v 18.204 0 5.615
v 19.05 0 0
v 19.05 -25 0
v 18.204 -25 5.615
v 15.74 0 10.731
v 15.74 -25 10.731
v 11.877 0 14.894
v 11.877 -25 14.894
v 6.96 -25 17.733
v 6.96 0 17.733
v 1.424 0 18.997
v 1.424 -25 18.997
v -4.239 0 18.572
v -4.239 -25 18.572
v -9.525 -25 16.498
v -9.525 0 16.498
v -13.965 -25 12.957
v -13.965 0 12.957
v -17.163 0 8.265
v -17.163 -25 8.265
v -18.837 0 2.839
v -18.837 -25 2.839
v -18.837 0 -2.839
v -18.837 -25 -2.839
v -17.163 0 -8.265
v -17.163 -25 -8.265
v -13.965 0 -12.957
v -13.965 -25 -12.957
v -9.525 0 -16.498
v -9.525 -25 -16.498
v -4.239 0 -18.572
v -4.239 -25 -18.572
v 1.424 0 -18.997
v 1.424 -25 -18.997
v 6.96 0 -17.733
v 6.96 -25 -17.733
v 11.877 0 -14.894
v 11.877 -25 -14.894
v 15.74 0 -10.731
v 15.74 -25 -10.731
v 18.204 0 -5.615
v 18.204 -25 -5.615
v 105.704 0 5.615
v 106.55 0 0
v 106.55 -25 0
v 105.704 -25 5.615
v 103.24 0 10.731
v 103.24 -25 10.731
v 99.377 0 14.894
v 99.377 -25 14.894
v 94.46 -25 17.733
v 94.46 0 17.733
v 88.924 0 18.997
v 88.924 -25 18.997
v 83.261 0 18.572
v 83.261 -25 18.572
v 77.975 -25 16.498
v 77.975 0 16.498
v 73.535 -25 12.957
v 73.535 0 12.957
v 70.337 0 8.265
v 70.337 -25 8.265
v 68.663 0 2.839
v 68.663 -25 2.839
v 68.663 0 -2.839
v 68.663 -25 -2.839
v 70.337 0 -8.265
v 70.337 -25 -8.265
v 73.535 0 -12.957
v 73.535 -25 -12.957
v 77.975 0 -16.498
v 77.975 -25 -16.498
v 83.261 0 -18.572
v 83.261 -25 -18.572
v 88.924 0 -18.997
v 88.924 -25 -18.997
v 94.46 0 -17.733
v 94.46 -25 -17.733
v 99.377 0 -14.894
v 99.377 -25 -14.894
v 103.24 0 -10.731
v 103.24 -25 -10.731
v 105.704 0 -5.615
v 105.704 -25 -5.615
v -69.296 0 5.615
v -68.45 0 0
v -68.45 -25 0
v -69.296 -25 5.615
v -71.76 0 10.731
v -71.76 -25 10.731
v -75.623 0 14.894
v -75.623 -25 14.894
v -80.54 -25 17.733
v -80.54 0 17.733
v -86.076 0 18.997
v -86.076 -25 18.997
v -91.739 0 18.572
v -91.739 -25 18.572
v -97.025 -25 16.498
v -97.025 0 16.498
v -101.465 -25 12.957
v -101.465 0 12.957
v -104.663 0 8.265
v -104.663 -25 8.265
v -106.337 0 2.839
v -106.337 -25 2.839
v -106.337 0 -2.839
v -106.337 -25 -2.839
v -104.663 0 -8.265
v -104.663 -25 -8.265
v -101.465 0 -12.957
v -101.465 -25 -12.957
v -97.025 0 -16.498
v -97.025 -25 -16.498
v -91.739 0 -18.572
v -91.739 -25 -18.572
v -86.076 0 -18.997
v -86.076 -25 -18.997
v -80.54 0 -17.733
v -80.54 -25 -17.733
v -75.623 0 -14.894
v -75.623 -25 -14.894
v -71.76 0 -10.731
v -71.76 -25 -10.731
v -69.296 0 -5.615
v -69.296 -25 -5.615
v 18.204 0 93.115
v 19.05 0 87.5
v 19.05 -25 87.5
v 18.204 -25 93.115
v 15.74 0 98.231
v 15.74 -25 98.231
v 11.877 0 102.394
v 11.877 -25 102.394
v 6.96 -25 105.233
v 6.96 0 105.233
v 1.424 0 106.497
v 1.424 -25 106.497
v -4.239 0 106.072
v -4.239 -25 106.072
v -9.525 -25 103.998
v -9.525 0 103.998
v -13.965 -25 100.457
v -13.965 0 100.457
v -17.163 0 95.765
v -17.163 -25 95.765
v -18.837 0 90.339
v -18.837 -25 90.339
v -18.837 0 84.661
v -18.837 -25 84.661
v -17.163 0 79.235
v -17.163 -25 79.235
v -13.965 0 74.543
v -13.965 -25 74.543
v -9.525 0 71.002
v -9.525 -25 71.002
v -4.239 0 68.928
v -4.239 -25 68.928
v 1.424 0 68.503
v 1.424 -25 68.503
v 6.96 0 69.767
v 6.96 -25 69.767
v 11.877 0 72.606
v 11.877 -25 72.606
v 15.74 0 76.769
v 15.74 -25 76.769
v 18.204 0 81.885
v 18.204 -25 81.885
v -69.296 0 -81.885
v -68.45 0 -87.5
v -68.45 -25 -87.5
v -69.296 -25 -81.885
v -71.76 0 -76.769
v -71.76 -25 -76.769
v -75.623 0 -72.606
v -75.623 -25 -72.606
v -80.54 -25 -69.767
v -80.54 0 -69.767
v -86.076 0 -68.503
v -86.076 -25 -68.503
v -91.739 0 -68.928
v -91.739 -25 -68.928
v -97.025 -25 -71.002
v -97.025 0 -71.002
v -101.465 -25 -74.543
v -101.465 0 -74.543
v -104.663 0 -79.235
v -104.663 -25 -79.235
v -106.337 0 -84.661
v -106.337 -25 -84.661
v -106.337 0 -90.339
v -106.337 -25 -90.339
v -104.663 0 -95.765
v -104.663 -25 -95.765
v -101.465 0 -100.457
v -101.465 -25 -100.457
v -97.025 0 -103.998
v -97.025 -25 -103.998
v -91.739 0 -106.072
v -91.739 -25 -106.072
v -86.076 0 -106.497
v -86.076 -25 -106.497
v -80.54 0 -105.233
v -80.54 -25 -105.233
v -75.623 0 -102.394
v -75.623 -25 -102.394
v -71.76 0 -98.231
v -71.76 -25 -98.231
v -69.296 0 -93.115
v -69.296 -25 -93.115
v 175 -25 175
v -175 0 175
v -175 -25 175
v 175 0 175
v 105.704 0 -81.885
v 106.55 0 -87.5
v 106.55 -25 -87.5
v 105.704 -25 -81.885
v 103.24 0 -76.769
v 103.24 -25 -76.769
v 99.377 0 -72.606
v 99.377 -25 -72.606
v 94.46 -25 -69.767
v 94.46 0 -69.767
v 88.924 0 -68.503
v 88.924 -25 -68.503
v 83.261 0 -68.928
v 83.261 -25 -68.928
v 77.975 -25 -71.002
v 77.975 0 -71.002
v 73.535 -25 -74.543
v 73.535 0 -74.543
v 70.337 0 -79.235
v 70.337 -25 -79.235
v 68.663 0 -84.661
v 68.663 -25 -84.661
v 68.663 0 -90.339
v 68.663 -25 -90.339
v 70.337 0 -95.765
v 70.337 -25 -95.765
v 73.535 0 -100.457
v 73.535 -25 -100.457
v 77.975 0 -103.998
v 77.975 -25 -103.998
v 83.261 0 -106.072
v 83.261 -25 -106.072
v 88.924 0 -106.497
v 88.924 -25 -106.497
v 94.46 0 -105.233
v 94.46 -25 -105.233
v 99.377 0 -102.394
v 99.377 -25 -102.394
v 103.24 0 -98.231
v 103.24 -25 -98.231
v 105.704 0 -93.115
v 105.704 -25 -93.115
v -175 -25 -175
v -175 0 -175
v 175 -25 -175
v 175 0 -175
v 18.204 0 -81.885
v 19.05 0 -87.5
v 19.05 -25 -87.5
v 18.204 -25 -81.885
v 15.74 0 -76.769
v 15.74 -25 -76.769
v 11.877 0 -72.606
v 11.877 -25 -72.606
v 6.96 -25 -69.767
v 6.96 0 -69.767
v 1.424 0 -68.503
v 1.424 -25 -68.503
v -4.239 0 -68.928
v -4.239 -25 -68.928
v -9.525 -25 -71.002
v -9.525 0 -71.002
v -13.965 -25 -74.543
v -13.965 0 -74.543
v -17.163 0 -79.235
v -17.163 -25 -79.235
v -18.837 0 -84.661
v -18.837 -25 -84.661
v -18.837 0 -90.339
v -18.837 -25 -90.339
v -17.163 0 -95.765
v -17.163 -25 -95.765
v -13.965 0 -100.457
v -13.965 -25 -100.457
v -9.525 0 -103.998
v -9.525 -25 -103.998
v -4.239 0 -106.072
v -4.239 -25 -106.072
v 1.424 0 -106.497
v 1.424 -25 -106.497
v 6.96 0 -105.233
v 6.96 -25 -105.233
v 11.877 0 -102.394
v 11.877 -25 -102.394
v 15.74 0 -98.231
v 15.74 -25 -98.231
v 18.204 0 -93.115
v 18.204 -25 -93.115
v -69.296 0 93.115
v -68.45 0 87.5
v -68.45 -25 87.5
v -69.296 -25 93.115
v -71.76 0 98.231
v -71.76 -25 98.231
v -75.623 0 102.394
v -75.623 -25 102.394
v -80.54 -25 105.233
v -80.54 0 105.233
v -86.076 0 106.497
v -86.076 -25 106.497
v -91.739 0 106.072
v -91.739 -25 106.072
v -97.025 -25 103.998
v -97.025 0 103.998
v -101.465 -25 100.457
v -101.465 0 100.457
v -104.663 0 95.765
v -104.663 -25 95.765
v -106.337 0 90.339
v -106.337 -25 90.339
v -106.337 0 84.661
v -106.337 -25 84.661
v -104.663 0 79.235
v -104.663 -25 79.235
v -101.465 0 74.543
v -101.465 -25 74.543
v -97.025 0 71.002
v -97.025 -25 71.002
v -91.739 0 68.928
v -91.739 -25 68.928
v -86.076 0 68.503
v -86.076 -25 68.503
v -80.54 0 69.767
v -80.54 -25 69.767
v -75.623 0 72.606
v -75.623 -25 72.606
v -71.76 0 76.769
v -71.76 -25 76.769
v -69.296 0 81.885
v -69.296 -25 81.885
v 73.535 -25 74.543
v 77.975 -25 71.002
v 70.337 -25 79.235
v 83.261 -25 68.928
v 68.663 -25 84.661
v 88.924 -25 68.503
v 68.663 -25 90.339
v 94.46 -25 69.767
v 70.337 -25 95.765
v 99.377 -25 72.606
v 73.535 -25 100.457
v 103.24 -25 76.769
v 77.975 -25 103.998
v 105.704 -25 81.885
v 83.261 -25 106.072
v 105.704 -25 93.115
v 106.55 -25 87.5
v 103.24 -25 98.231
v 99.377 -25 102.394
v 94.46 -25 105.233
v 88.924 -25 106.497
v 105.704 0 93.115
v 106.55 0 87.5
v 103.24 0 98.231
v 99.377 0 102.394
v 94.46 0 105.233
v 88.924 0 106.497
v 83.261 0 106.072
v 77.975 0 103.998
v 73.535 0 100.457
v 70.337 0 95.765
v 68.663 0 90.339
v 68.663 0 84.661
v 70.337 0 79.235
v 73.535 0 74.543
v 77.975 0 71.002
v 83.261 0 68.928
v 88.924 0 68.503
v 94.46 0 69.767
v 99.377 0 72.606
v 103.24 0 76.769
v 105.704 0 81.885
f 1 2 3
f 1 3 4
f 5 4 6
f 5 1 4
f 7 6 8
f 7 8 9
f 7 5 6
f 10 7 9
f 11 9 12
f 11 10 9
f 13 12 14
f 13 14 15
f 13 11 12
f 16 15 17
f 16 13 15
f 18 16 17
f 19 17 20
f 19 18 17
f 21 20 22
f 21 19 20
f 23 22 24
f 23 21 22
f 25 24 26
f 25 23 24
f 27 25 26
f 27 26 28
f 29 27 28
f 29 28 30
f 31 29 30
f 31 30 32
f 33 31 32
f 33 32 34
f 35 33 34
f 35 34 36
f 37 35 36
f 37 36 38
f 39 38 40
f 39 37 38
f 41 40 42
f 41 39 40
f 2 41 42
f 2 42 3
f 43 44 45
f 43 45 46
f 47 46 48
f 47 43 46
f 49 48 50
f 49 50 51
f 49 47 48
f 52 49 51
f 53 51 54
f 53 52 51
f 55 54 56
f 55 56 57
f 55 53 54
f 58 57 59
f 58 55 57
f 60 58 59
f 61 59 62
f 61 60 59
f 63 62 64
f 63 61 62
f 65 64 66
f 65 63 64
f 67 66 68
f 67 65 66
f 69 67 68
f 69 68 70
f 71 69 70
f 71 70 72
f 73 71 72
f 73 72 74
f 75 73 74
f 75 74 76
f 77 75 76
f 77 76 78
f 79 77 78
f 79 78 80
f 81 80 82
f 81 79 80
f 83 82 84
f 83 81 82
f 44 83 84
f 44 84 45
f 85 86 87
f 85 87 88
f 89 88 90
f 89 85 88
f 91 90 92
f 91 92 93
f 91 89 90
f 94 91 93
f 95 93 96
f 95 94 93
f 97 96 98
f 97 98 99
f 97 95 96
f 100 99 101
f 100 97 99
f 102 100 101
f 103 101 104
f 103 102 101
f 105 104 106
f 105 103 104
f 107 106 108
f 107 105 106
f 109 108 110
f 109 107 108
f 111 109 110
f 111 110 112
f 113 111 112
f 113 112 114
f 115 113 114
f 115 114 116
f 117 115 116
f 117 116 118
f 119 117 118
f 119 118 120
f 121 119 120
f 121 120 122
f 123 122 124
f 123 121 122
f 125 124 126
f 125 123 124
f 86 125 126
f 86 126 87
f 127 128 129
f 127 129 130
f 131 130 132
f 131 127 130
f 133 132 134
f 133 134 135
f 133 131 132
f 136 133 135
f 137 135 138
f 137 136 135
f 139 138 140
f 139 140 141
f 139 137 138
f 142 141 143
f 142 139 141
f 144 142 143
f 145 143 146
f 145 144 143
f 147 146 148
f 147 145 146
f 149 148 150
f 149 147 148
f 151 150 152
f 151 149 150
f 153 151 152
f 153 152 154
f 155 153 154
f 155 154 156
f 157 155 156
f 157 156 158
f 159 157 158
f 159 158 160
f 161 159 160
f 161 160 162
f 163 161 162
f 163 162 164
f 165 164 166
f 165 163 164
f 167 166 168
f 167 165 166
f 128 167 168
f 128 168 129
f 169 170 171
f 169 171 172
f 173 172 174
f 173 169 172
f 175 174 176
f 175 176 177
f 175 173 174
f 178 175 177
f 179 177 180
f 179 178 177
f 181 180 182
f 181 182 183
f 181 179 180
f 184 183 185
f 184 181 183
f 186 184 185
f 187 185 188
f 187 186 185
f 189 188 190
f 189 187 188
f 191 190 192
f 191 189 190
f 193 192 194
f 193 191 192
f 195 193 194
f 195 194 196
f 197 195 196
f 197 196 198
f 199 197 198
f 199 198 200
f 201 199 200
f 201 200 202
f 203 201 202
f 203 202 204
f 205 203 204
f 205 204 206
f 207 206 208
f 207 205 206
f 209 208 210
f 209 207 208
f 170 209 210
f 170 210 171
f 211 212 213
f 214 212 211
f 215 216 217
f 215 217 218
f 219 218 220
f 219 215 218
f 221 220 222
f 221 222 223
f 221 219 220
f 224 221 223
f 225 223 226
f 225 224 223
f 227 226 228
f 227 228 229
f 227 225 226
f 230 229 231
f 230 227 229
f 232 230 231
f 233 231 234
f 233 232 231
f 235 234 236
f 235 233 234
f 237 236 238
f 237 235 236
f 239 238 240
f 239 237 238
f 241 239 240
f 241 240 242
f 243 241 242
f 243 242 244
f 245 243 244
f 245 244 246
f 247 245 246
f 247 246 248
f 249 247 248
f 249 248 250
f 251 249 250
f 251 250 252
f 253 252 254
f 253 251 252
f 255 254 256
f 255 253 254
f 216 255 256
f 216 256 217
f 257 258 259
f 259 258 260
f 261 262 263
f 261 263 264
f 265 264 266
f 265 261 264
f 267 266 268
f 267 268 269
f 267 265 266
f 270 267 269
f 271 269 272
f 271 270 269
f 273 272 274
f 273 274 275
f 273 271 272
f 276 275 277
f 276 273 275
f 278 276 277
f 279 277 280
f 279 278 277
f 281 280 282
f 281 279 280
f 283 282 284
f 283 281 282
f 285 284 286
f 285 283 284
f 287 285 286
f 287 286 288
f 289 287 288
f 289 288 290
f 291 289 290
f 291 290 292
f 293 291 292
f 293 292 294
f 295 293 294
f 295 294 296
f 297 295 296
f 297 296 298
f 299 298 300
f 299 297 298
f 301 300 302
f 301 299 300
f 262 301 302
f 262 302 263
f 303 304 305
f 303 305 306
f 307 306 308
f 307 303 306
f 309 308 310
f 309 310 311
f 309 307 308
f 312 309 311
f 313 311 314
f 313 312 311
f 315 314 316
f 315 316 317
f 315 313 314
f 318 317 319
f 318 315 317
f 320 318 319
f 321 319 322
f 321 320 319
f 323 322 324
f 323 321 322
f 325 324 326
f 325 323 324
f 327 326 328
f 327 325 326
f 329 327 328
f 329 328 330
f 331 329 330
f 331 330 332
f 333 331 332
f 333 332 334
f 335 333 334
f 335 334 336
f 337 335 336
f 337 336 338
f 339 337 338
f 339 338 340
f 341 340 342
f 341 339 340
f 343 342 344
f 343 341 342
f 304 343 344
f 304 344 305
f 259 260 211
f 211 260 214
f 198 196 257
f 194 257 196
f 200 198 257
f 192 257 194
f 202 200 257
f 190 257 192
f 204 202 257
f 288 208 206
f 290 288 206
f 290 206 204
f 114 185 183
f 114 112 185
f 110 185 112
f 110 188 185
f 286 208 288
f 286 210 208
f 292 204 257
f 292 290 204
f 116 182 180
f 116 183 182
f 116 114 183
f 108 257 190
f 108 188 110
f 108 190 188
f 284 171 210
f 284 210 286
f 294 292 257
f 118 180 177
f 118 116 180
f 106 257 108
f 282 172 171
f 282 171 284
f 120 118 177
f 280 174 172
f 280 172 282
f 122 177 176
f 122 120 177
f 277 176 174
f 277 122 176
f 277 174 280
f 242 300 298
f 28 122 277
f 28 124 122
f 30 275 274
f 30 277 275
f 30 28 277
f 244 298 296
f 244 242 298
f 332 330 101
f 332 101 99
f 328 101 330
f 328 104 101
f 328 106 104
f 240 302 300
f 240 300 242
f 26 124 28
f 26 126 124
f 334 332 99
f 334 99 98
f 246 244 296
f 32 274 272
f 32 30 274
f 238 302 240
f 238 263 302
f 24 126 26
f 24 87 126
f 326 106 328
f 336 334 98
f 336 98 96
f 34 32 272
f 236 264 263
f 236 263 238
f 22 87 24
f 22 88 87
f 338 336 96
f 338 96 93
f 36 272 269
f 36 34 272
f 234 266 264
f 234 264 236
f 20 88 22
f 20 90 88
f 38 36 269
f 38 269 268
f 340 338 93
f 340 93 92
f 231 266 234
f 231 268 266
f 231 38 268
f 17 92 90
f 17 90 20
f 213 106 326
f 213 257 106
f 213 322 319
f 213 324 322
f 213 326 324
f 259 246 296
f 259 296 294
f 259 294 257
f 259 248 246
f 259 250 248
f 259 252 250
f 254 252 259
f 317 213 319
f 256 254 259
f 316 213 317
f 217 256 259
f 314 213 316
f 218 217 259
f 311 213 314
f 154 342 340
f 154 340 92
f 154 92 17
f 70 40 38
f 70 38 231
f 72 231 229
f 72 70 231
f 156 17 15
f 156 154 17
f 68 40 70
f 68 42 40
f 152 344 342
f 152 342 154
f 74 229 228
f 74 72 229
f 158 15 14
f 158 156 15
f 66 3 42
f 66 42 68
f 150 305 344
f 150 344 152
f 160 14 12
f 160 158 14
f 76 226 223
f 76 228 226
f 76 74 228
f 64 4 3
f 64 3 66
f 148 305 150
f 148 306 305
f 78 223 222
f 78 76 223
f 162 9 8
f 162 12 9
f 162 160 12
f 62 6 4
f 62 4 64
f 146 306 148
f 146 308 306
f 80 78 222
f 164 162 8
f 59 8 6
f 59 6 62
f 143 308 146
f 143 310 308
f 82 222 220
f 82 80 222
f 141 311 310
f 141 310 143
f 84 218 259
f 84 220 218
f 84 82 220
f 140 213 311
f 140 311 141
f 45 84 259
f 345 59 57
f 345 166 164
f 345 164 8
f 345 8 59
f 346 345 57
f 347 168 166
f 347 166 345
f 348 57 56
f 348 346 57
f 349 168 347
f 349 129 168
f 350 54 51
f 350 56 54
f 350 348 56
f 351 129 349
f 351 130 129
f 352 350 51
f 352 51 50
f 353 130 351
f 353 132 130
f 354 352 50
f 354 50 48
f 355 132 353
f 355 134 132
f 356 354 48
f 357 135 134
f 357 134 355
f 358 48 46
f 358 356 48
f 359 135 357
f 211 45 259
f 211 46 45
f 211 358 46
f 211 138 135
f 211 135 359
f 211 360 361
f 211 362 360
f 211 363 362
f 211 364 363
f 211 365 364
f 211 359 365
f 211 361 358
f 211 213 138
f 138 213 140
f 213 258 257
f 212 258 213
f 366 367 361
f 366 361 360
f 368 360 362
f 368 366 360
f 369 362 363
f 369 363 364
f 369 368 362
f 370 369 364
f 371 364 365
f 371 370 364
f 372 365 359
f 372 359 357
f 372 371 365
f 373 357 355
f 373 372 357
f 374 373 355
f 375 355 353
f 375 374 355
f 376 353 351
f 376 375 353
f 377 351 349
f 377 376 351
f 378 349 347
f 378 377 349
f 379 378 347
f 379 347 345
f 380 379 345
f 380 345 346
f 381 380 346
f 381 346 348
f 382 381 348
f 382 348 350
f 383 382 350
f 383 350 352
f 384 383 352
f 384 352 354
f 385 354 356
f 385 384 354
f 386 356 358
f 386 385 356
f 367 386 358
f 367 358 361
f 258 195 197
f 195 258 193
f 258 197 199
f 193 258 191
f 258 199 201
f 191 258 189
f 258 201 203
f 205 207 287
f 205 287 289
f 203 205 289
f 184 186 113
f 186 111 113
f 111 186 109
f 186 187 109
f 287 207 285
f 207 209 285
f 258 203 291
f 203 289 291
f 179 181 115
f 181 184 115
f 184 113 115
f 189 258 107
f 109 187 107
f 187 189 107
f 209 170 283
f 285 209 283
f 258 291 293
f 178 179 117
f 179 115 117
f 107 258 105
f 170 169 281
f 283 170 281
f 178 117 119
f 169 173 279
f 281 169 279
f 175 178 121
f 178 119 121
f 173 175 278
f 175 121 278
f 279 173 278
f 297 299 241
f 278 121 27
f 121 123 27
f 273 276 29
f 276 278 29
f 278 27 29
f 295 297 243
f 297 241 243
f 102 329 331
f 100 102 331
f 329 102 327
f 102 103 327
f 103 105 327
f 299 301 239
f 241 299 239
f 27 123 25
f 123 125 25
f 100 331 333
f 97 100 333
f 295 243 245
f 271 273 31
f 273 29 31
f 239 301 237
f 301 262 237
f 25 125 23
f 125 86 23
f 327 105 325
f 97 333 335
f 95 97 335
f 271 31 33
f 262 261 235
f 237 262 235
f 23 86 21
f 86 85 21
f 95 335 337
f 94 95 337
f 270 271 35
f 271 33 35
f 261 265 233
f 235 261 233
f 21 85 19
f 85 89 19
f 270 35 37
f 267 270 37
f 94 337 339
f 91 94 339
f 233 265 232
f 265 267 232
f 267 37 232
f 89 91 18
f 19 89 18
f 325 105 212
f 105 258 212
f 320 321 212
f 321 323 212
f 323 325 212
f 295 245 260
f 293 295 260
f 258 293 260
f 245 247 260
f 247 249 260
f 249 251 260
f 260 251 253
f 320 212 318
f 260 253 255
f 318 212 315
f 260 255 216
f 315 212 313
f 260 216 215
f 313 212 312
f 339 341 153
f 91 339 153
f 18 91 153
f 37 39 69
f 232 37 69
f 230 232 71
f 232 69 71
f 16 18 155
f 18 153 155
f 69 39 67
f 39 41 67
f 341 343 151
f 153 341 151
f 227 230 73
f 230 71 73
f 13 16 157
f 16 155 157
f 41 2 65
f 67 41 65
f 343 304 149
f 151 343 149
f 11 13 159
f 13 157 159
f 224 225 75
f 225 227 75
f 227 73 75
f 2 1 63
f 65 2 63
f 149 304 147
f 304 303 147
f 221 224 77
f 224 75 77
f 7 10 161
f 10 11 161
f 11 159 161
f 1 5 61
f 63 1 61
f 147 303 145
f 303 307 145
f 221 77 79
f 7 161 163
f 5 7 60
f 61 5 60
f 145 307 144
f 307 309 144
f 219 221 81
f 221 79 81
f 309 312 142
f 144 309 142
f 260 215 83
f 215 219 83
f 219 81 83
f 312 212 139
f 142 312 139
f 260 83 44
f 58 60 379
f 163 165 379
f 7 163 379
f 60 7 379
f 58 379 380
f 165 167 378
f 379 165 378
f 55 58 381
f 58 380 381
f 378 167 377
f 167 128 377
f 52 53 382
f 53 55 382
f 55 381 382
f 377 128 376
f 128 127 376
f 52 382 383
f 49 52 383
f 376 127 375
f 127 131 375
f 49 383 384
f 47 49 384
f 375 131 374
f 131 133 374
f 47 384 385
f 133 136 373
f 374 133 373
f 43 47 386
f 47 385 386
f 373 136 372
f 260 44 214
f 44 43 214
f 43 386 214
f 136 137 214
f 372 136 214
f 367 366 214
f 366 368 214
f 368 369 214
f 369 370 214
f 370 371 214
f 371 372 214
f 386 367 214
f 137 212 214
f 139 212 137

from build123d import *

# Parameters (mm, degrees)
F0_W     = 350
F0_H     = 350
F0_R     = 19.05
F1_DEPTH = 25


with BuildPart() as f1:
    # F0 (on Front) → F1 (new body)
    with BuildSketch(Plane.XZ):
        Rectangle(F0_W, F0_H)
        with Locations((-87.5, -87.5)):
            Circle(F0_R, mode=Mode.SUBTRACT)
        with Locations((0, -87.5)):
            Circle(F0_R, mode=Mode.SUBTRACT)
        with Locations((87.5, -87.5)):
            Circle(F0_R, mode=Mode.SUBTRACT)
        with Locations((-87.5, 0)):
            Circle(F0_R, mode=Mode.SUBTRACT)
        with Locations((-87.5, 87.5)):
            Circle(F0_R, mode=Mode.SUBTRACT)
        Circle(F0_R, mode=Mode.SUBTRACT)
        with Locations((87.5, 0)):
            Circle(F0_R, mode=Mode.SUBTRACT)
        with Locations((0, 87.5)):
            Circle(F0_R, mode=Mode.SUBTRACT)
        with Locations((87.5, 87.5)):
            Circle(F0_R, mode=Mode.SUBTRACT)
    extrude(amount=F1_DEPTH)


solid = f1.part
